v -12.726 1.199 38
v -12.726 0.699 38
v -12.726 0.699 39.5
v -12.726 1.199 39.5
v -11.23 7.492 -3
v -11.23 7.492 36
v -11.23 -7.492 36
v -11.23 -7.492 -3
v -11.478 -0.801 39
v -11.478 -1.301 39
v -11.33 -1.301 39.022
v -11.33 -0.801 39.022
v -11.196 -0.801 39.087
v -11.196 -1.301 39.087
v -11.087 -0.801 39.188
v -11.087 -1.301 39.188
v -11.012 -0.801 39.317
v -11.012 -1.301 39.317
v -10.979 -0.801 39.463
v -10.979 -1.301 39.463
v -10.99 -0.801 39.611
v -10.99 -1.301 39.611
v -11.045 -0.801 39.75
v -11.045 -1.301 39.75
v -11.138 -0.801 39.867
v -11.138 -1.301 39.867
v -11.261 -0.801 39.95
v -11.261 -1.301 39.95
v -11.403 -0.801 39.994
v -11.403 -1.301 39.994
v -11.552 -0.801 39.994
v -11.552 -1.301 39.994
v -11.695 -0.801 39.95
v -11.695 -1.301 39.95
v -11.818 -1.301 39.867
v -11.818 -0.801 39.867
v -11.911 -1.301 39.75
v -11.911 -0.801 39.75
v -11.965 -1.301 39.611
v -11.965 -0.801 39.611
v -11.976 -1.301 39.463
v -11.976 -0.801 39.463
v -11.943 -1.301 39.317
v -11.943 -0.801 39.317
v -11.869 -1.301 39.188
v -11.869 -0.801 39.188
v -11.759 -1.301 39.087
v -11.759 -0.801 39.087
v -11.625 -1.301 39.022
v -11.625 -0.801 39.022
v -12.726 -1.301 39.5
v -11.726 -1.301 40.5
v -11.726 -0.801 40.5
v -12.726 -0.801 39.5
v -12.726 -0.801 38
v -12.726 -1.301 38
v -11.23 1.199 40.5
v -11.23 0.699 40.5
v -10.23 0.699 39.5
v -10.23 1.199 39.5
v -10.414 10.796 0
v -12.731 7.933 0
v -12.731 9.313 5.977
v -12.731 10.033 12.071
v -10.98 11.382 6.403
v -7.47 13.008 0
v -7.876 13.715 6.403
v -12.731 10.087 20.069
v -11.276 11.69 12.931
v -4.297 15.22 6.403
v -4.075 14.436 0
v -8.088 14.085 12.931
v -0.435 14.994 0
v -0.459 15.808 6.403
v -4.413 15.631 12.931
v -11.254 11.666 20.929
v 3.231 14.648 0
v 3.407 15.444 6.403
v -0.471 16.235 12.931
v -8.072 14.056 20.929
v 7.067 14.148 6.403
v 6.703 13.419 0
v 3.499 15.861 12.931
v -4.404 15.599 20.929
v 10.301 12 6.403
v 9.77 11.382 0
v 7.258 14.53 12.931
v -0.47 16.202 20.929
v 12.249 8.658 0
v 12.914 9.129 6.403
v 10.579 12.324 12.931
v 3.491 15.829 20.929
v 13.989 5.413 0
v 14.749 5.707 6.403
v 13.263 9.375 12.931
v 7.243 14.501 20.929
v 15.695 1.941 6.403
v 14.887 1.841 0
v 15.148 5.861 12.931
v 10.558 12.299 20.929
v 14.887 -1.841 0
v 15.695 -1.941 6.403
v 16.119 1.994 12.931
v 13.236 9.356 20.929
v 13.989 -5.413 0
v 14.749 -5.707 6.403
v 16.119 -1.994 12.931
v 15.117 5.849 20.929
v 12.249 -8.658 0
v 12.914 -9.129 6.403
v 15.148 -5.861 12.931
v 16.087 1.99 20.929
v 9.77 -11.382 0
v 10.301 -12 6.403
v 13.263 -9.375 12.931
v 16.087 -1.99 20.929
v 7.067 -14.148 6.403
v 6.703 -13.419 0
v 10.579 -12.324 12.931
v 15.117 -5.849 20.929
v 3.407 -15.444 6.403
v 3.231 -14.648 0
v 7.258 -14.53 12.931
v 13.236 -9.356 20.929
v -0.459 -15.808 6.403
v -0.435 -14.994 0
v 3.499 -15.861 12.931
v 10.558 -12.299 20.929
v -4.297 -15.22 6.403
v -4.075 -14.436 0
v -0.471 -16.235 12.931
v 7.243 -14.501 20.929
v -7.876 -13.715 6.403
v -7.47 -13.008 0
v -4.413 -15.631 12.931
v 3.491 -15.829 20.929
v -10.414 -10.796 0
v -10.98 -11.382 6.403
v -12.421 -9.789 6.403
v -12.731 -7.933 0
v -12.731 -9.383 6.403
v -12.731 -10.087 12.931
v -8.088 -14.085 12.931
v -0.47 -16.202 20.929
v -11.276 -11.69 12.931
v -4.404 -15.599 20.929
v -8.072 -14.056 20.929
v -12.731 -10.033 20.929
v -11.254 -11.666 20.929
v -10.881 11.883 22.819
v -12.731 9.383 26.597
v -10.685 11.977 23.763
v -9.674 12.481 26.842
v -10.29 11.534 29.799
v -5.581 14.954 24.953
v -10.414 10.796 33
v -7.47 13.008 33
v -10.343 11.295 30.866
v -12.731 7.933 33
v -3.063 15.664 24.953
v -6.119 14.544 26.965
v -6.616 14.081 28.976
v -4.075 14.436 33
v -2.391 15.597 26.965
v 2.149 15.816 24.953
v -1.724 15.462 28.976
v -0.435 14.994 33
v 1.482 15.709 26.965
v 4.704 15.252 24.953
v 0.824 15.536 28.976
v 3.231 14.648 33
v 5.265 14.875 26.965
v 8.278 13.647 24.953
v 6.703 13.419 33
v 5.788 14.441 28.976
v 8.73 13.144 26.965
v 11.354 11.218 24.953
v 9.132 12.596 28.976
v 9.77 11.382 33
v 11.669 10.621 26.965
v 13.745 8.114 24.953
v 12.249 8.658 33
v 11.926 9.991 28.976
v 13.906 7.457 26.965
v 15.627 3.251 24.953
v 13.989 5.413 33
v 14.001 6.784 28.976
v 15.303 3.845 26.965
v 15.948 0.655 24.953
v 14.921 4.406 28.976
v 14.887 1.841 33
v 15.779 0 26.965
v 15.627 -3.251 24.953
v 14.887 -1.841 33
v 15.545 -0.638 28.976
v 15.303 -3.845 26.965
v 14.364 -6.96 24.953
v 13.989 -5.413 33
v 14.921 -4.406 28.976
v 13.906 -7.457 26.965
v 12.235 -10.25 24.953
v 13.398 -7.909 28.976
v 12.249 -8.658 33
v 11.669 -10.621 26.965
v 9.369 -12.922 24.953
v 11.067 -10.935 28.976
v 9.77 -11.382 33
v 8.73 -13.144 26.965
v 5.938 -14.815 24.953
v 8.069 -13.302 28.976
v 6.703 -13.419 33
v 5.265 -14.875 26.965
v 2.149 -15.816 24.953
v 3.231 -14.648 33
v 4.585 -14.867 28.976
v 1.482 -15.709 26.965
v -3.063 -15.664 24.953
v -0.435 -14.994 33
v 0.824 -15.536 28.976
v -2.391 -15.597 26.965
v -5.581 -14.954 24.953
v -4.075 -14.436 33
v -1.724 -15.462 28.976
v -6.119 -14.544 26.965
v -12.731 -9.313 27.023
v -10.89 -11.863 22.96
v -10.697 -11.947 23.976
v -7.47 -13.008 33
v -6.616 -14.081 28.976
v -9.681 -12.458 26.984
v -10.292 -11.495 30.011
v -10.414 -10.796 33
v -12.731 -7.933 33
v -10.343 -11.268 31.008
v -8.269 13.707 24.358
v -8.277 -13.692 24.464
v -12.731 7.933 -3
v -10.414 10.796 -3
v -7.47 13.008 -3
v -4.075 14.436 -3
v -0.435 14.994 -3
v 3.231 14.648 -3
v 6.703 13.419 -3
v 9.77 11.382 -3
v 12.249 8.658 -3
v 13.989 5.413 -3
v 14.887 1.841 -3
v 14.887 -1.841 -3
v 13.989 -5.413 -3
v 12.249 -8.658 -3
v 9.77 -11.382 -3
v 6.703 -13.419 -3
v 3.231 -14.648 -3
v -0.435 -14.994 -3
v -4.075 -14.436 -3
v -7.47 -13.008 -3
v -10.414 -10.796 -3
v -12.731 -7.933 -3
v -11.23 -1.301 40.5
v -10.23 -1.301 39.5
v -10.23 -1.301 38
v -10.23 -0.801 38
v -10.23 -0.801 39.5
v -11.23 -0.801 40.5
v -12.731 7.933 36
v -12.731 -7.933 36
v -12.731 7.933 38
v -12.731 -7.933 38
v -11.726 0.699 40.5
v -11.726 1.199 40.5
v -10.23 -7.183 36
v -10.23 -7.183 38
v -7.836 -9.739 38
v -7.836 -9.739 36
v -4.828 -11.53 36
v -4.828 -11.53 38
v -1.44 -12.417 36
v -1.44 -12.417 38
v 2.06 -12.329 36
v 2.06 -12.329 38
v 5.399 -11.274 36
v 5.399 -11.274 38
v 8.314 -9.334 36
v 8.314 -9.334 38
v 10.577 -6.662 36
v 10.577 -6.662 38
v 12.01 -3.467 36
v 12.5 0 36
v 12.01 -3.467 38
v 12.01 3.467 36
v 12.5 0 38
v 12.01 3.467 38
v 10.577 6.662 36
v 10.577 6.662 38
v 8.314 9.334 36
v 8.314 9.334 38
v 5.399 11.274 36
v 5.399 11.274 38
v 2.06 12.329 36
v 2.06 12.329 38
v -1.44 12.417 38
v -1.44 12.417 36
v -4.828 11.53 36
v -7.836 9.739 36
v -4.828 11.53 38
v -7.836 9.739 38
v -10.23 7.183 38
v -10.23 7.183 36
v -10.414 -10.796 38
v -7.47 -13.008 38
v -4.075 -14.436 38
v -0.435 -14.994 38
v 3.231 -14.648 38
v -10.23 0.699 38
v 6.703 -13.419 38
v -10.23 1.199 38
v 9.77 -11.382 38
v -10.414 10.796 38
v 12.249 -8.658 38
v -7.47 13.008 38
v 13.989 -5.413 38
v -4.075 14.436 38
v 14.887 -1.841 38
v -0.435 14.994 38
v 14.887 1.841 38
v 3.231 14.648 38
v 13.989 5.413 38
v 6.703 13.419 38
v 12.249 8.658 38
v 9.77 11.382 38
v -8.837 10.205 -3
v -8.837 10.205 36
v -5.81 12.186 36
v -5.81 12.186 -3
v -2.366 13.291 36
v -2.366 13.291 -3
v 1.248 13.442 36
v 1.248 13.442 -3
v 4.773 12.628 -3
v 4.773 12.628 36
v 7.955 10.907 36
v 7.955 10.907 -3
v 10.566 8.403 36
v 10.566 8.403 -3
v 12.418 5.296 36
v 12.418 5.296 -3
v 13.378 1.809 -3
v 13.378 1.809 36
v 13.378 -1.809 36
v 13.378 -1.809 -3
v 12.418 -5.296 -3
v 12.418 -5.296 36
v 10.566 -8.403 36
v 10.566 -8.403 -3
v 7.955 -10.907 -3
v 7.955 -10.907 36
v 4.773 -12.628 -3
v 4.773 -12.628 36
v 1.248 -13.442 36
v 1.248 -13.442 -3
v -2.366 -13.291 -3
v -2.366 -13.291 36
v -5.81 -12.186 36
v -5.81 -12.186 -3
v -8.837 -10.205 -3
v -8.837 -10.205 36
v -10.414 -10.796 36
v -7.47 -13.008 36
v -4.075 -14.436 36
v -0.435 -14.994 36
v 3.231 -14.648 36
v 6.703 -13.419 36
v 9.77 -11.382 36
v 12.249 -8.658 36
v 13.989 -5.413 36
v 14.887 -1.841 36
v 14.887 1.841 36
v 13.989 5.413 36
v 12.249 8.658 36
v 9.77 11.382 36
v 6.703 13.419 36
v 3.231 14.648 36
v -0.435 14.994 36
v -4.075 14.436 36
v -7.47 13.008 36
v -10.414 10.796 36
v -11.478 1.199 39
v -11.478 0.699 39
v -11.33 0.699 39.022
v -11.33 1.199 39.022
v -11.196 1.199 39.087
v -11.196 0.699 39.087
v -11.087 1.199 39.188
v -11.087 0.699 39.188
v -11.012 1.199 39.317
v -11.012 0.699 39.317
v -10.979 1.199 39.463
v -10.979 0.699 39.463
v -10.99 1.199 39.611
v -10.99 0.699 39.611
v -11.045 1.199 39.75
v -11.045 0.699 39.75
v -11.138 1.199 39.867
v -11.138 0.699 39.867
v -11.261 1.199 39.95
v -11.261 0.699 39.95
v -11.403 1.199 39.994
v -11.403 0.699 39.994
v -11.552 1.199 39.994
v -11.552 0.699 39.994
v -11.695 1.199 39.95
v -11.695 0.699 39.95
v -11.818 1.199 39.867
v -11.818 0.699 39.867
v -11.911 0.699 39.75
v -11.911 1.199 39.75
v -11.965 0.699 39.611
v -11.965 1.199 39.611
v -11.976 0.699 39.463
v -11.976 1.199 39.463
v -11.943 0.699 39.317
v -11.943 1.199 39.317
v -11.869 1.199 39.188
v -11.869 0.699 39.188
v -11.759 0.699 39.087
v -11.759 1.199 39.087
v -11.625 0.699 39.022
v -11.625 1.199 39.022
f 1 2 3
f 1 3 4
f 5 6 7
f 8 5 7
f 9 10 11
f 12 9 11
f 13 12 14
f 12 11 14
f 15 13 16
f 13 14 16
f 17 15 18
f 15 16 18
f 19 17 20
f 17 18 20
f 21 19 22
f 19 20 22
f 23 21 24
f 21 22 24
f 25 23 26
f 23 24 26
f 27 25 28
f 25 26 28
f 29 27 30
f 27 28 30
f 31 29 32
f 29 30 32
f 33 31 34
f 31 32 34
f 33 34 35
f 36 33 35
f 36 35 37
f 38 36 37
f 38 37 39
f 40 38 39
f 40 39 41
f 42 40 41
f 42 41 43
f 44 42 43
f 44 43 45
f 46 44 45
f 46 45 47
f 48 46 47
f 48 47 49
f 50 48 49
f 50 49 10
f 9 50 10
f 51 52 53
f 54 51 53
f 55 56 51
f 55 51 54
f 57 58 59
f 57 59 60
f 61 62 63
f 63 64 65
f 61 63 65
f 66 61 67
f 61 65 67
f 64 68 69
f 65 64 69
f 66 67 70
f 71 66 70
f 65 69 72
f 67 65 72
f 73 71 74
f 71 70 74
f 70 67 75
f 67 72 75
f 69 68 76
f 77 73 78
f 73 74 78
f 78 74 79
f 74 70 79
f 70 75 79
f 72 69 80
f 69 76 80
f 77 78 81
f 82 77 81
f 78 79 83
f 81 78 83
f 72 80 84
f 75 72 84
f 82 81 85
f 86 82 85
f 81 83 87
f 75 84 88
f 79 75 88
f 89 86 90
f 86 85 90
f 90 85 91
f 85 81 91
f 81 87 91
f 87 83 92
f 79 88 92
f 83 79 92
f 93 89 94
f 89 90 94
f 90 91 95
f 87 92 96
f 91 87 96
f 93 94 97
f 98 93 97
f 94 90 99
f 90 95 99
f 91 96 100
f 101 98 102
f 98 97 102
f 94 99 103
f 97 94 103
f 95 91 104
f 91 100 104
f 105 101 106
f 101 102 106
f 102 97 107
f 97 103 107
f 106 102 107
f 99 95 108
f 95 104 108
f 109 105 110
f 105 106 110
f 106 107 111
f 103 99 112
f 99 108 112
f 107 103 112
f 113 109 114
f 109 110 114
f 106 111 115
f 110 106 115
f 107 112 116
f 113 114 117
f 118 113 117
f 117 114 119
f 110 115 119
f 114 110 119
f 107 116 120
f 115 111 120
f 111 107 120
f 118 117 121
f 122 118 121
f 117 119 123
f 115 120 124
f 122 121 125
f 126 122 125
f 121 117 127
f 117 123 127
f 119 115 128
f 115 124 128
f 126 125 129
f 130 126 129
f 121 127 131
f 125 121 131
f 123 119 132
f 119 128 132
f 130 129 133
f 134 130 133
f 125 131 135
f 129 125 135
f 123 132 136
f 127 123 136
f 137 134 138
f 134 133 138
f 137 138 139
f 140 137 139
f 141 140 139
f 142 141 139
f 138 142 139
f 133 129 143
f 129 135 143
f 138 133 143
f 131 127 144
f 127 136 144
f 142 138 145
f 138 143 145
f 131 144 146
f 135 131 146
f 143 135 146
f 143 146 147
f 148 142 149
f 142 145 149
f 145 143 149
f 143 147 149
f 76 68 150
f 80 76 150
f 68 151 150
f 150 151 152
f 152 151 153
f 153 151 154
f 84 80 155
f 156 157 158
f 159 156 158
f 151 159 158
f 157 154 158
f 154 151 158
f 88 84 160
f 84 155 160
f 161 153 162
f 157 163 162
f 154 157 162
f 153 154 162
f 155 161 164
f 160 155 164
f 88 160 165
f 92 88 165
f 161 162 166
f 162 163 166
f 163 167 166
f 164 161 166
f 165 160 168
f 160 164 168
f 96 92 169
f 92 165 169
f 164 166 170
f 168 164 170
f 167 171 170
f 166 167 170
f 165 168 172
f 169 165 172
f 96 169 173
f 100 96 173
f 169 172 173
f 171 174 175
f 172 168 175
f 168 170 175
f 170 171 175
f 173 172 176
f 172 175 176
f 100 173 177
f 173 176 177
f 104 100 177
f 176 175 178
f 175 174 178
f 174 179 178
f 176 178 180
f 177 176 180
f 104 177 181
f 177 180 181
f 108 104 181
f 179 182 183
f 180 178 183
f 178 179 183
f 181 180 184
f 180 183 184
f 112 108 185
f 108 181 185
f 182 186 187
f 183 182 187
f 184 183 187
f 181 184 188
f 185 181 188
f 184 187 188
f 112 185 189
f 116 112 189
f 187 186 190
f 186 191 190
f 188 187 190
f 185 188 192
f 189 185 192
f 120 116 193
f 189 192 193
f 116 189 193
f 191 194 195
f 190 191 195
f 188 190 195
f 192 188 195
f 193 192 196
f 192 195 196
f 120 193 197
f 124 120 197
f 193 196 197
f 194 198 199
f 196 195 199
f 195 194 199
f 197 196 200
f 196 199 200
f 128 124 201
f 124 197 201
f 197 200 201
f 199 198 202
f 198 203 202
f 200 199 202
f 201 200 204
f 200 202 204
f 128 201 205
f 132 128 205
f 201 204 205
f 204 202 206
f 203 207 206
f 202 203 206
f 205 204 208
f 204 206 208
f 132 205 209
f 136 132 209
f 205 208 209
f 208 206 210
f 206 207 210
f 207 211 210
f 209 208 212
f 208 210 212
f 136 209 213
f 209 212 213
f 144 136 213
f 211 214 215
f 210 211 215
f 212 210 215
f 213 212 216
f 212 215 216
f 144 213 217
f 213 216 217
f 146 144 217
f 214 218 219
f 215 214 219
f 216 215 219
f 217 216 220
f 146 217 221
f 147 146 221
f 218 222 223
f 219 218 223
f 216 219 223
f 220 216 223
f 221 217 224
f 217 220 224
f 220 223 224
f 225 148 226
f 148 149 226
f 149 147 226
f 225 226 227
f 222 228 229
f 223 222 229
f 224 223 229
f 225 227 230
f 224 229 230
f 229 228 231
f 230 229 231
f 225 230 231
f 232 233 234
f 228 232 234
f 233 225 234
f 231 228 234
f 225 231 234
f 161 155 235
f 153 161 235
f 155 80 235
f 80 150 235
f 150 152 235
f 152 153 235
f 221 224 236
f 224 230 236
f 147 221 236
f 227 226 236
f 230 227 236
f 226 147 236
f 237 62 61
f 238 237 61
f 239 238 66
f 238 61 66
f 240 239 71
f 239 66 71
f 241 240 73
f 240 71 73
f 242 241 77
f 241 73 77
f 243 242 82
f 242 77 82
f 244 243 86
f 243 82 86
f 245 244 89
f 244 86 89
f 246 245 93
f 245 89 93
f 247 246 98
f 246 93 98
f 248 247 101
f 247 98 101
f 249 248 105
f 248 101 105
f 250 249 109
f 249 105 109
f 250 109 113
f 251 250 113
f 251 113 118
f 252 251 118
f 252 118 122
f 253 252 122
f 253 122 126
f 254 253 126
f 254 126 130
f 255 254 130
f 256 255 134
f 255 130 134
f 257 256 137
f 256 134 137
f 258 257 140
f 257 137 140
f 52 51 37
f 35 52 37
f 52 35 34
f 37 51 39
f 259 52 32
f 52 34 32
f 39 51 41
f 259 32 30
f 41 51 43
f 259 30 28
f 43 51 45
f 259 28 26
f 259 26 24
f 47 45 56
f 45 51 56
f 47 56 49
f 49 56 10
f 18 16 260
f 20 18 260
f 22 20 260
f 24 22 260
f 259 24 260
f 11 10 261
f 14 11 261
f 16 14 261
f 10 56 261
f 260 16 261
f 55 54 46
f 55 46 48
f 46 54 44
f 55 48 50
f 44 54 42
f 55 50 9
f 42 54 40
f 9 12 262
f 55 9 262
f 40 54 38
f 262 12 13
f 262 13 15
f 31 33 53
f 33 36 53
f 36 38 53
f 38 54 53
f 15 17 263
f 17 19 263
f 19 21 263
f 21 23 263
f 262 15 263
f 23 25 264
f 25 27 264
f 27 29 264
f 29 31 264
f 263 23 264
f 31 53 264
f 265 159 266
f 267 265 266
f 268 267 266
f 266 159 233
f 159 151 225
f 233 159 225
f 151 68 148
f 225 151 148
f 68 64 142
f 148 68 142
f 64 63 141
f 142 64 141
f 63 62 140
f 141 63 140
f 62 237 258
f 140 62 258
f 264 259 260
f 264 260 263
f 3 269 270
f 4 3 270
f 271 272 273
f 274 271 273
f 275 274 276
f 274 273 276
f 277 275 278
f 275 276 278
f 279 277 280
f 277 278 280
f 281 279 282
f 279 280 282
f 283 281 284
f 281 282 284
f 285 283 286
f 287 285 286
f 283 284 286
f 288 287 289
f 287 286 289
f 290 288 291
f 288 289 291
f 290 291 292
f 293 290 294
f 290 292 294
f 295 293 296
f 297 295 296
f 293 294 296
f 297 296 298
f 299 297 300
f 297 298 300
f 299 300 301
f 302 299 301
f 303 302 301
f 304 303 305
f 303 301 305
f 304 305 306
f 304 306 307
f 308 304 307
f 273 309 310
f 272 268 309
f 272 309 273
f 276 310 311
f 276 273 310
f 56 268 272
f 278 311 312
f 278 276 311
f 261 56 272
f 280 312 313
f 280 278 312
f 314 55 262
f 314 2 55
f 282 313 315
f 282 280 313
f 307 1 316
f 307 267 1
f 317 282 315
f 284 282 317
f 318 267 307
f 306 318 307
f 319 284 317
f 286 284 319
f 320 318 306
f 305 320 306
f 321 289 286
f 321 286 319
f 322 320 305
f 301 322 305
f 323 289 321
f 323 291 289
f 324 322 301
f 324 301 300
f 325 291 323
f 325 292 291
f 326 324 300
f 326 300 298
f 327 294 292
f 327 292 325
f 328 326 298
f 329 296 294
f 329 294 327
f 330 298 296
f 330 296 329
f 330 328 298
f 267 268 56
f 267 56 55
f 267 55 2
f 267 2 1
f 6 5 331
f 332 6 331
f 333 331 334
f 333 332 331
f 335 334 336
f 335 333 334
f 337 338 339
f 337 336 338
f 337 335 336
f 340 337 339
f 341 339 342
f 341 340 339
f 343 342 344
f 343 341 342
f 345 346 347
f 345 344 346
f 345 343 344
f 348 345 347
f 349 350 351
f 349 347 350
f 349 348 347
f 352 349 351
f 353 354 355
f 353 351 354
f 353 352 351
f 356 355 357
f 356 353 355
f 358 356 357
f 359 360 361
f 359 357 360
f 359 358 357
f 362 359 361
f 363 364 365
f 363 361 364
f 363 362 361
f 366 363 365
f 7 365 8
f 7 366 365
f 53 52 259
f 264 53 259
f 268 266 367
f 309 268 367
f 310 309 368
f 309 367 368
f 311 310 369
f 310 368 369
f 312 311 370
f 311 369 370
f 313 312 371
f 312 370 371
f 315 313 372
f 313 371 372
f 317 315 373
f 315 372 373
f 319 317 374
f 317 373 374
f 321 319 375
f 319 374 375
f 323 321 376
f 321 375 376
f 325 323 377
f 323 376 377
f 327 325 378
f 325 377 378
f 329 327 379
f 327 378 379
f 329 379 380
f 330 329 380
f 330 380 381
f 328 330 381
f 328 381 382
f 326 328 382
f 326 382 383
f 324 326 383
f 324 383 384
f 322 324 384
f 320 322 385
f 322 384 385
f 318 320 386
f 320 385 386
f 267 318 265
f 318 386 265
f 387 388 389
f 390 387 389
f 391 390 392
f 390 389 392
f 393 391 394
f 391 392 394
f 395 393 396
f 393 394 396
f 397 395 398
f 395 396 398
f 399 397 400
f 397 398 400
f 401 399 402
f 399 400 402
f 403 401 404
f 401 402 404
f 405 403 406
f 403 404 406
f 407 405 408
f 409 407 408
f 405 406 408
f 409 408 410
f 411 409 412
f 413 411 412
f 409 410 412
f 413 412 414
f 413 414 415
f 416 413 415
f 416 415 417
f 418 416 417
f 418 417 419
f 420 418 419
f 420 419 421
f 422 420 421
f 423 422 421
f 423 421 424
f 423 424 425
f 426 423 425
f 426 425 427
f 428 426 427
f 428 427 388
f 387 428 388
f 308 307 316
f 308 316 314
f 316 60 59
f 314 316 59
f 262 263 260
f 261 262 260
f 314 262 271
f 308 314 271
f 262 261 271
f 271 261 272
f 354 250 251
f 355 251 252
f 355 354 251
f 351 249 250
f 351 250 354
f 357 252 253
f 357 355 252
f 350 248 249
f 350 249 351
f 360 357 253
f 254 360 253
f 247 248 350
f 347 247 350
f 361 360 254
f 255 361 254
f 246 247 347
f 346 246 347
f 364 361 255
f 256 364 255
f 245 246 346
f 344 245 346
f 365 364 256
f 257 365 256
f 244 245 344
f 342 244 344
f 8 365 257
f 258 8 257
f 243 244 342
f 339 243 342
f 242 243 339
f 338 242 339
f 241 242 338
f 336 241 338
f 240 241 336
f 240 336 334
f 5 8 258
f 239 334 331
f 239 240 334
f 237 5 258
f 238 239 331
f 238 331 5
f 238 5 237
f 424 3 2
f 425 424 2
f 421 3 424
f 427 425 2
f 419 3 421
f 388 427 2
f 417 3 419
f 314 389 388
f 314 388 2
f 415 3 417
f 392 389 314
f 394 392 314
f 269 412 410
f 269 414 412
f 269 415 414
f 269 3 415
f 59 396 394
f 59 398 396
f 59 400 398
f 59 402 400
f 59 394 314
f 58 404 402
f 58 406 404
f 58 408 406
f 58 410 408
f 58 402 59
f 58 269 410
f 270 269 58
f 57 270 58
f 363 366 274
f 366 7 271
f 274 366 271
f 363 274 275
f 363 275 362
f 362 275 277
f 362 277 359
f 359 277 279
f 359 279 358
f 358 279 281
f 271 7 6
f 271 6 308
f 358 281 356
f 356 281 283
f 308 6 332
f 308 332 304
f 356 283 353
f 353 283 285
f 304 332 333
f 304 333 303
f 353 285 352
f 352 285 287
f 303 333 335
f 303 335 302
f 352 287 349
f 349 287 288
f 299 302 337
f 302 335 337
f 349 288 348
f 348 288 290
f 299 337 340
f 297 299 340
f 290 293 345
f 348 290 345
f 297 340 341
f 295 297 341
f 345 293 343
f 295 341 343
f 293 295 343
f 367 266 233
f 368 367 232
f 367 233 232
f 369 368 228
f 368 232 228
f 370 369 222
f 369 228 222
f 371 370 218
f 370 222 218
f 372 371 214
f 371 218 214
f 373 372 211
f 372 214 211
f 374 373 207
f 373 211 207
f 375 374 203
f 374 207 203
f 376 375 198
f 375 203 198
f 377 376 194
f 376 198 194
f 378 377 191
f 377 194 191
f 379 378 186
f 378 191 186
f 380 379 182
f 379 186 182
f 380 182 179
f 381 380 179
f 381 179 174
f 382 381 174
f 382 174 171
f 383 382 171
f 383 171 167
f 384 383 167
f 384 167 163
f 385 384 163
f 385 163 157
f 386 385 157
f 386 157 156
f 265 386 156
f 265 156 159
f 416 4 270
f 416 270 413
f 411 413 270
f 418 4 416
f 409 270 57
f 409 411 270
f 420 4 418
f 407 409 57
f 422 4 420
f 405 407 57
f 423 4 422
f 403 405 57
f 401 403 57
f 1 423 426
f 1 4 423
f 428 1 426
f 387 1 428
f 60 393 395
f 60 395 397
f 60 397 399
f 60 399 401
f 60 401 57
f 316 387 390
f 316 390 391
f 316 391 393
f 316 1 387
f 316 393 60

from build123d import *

# Parameters (mm, degrees)
BOSS_EXTRUDE1_DEPTH       = 33
CUT_EXTRUDE2_DEPTH        = 33
CUT_EXTRUDE3_DEPTH        = 33
SKETCH5_R                 = 15
SKETCH5_R_2               = 13.5
BOSS_EXTRUDE2_DEPTH       = 3
SKETCH6_R                 = 15
SKETCH6_R_2               = 13.5
BOSS_EXTRUDE6_DEPTH       = 3
BOSS_EXTRUDE8_DEPTH       = 1
BOSS_EXTRUDE9_DEPTH       = 1
CUT_EXTRUDE4_DEPTH        = 43
BOSS_EXTRUDE16_DEPTH      = 3
BOSS_EXTRUDE16_DEPTH_BACK = 36
BOSS_EXTRUDE18_DEPTH      = 2
CUT_EXTRUDE5_DEPTH        = 6
SKETCH15_W                = 2.495675776
SKETCH15_H                = 2.5
BOSS_EXTRUDE19_DEPTH      = 2.5
SKETCH16_W                = 2.495675776
SKETCH16_H                = 1.5
CUT_EXTRUDE6_DEPTH        = 2.5
SKETCH17_R                = 0.5
CUT_EXTRUDE7_DEPTH        = 2.5
CHAMFER1_SIZE             = 1


with BuildPart() as part:
    # Sketch1 → Boss-Extrude1 (new body)
    with BuildSketch(Plane.XY):
        with BuildLine():
            Line((-12.730582936, -7.932985447), (-12.730582936, 7.932985447))
            ThreePointArc((-12.730582936, 7.932985447), (15, 0), (-12.730582936, -7.932985447))
        make_face()
    extrude(amount=BOSS_EXTRUDE1_DEPTH)

    # Sketch2 → Cut-Extrude2 (cut)
    with BuildSketch(Plane.XY.offset(33)):
        with BuildLine():
            Line((-11.23, 7.492469553), (-11.23, -7.492469553))
            ThreePointArc((-11.23, -7.492469553), (13.5, 0), (-11.23, 7.492469553))
        make_face()
    extrude(amount=-CUT_EXTRUDE2_DEPTH, mode=Mode.SUBTRACT)

    # Sketch3 → Revolve1 (revolve)
    with BuildSketch(Plane(origin=(0, 0, 0), x_dir=(1, 0, 0), z_dir=(0, 1, 0))):
        with BuildLine():
            Line((15, 0), (15, -33))
            add(Edge.make_bspline(
                [(15, 0), (17.606147379, -16.5), (15, -33)],
                knots=[0, 0, 0, 1, 1, 1], degree=2))
        make_face()
    revolve(axis=Axis((0, 0, 1000), (0, 0, -1)))

    # Sketch4 → Cut-Extrude3 (cut)
    with BuildSketch(Plane(origin=(0, 0, 0), x_dir=(-1, 0, 0), z_dir=(0, 0, -1))):
        Polygon((12.730582936, 16.416653829), (12.730582936, -13.128756539), (18.380259155, -13.128756539), (18.380259155, 16.827640991), align=None)
    extrude(amount=-CUT_EXTRUDE3_DEPTH, mode=Mode.SUBTRACT)

    # Sketch5 → Boss-Extrude2 (add)
    with BuildSketch(Plane.XY.offset(33)):
        with Locations(Location((0, 0, 0), (0, 0, 211.9288465))):
            Circle(SKETCH5_R)
        Circle(SKETCH5_R_2, mode=Mode.SUBTRACT)
    extrude(amount=BOSS_EXTRUDE2_DEPTH)

    # Sketch6 → Boss-Extrude6 (add)
    with BuildSketch(Plane(origin=(0, 0, 0), x_dir=(-1, 0, 0), z_dir=(0, 0, -1))):
        with Locations(Location((0, 0, 0), (0, 0, 328.0711535))):
            Circle(SKETCH6_R)
        with Locations(Location((0, 0, 0), (0, 0, 180))):
            Circle(SKETCH6_R_2, mode=Mode.SUBTRACT)
    extrude(amount=BOSS_EXTRUDE6_DEPTH)

    # Sketch7 → Boss-Extrude8 (add)
    with BuildSketch(Plane(origin=(0, 0, 0), x_dir=(-1, 0, 0), z_dir=(0, 0, -1))):
        with BuildLine():
            Line((12.730582936, 4.492466817), (12.730582936, -4.320544614))
            add(Edge.make_bspline(
                [(12.730582936, 4.492466817), (14.26616245, 0.098577046), (12.730582936, -4.320544614)],
                knots=[0, 0, 0, 1, 1, 1], degree=2))
        make_face()
    extrude(amount=-BOSS_EXTRUDE8_DEPTH)

    # Sketch8 → Boss-Extrude9 (add)
    with BuildSketch(Plane.XY.offset(33)):
        with BuildLine():
            Line((-12.730582936, 4.492466817), (-12.730582936, -4.320544614))
            add(Edge.make_bspline(
                [(-12.730582936, 4.492466817), (-13.227968128, 3.051756818), (-13.780379485, 0.057351366), (-13.212282114, -2.937471643), (-12.730582936, -4.320544614)],
                knots=[0, 0, 0, 0, 0.509558316, 1, 1, 1, 1], degree=3))
        make_face()
    extrude(amount=-BOSS_EXTRUDE9_DEPTH)

    # Sketch10 → Cut-Extrude4 (cut)
    with BuildSketch(Plane(origin=(0, 0, -3), x_dir=(-1, 0, 0), z_dir=(0, 0, -1))):
        Polygon((12.730582936, 10.184422901), (12.730582936, -10.184422901), (17.774387551, -7.968584404), (17.180739429, 9.475537328), align=None)
    extrude(amount=-CUT_EXTRUDE4_DEPTH, mode=Mode.SUBTRACT)

    # Sketch12 → Boss-Extrude16 (add, two sides)
    with BuildSketch(Plane.XY.offset(33)) as boss_extrude16_sk:
        Polygon((-11.23, 7.492469553), (-11.23, -7.492469553), (-12.730582936, -7.492469553), (-12.730582936, -4.492466817), (-12.730582936, 4.492466817), (-12.730582936, 7.492469553), align=None)
    extrude(amount=BOSS_EXTRUDE16_DEPTH)
    extrude(boss_extrude16_sk.sketch, amount=-BOSS_EXTRUDE16_DEPTH_BACK)

    # Sketch13 → Boss-Extrude18 (add)
    with BuildSketch(Plane.XY.offset(36)):
        with BuildLine():
            Line((-12.730582936, 7.932985447), (-12.730582936, -7.932985447))
            ThreePointArc((-12.730582936, -7.932985447), (15, 0), (-12.730582936, 7.932985447))
        make_face()
        with BuildLine():
            Line((-11.23, -7.492469553), (-11.23, 7.492469553))
            ThreePointArc((-11.23, 7.492469553), (13.5, 0), (-11.23, -7.492469553))
        make_face(mode=Mode.SUBTRACT)
        with BuildLine():
            ThreePointArc((-11.23, 7.492469553), (13.5, 0), (-11.23, -7.492469553))
            Line((-11.23, -7.492469553), (-11.23, 7.492469553))
        make_face()
    extrude(amount=BOSS_EXTRUDE18_DEPTH)

    # Sketch14 → Cut-Extrude5 (cut)
    with BuildSketch(Plane.XY.offset(38)):
        with BuildLine():
            Line((-10.23, 7.183112139), (-10.23, -7.183112139))
            ThreePointArc((-10.23, -7.183112139), (12.5, 0), (-10.23, 7.183112139))
        make_face()
    extrude(amount=-CUT_EXTRUDE5_DEPTH, mode=Mode.SUBTRACT)

    # Sketch15 → Boss-Extrude19 (add)
    with BuildSketch(Plane.XY.offset(38)):
        with Locations((-11.477837888, -0.051459344)):
            Rectangle(SKETCH15_W, SKETCH15_H)
    extrude(amount=BOSS_EXTRUDE19_DEPTH)

    # Sketch16 → Cut-Extrude6 (cut)
    with BuildSketch(Plane.XY.offset(40.5)):
        with Locations((-11.477837888, -0.051459344)):
            Rectangle(SKETCH16_W, SKETCH16_H)
    extrude(amount=-CUT_EXTRUDE6_DEPTH, mode=Mode.SUBTRACT)

    # Sketch17 → Cut-Extrude7 (cut)
    with BuildSketch(Plane.XZ.offset(1.301459344)):
        with Locations(Location((-11.477837888, 39.5, 0), (0, 0, 270))):
            Circle(SKETCH17_R)
    extrude(amount=-CUT_EXTRUDE7_DEPTH, mode=Mode.SUBTRACT)

    # Chamfer1
    chamfer1_edges = [part.edges().sort_by_distance(p)[0] for p in [
        (-12.725675776, -1.051459344, 40.5),
        (-12.725675776, 0.948540656, 40.5),
        (-10.23, -1.051459344, 40.5),
        (-10.23, 0.948540656, 40.5),
    ]]
    chamfer(chamfer1_edges, length=CHAMFER1_SIZE)


solid = part.part
